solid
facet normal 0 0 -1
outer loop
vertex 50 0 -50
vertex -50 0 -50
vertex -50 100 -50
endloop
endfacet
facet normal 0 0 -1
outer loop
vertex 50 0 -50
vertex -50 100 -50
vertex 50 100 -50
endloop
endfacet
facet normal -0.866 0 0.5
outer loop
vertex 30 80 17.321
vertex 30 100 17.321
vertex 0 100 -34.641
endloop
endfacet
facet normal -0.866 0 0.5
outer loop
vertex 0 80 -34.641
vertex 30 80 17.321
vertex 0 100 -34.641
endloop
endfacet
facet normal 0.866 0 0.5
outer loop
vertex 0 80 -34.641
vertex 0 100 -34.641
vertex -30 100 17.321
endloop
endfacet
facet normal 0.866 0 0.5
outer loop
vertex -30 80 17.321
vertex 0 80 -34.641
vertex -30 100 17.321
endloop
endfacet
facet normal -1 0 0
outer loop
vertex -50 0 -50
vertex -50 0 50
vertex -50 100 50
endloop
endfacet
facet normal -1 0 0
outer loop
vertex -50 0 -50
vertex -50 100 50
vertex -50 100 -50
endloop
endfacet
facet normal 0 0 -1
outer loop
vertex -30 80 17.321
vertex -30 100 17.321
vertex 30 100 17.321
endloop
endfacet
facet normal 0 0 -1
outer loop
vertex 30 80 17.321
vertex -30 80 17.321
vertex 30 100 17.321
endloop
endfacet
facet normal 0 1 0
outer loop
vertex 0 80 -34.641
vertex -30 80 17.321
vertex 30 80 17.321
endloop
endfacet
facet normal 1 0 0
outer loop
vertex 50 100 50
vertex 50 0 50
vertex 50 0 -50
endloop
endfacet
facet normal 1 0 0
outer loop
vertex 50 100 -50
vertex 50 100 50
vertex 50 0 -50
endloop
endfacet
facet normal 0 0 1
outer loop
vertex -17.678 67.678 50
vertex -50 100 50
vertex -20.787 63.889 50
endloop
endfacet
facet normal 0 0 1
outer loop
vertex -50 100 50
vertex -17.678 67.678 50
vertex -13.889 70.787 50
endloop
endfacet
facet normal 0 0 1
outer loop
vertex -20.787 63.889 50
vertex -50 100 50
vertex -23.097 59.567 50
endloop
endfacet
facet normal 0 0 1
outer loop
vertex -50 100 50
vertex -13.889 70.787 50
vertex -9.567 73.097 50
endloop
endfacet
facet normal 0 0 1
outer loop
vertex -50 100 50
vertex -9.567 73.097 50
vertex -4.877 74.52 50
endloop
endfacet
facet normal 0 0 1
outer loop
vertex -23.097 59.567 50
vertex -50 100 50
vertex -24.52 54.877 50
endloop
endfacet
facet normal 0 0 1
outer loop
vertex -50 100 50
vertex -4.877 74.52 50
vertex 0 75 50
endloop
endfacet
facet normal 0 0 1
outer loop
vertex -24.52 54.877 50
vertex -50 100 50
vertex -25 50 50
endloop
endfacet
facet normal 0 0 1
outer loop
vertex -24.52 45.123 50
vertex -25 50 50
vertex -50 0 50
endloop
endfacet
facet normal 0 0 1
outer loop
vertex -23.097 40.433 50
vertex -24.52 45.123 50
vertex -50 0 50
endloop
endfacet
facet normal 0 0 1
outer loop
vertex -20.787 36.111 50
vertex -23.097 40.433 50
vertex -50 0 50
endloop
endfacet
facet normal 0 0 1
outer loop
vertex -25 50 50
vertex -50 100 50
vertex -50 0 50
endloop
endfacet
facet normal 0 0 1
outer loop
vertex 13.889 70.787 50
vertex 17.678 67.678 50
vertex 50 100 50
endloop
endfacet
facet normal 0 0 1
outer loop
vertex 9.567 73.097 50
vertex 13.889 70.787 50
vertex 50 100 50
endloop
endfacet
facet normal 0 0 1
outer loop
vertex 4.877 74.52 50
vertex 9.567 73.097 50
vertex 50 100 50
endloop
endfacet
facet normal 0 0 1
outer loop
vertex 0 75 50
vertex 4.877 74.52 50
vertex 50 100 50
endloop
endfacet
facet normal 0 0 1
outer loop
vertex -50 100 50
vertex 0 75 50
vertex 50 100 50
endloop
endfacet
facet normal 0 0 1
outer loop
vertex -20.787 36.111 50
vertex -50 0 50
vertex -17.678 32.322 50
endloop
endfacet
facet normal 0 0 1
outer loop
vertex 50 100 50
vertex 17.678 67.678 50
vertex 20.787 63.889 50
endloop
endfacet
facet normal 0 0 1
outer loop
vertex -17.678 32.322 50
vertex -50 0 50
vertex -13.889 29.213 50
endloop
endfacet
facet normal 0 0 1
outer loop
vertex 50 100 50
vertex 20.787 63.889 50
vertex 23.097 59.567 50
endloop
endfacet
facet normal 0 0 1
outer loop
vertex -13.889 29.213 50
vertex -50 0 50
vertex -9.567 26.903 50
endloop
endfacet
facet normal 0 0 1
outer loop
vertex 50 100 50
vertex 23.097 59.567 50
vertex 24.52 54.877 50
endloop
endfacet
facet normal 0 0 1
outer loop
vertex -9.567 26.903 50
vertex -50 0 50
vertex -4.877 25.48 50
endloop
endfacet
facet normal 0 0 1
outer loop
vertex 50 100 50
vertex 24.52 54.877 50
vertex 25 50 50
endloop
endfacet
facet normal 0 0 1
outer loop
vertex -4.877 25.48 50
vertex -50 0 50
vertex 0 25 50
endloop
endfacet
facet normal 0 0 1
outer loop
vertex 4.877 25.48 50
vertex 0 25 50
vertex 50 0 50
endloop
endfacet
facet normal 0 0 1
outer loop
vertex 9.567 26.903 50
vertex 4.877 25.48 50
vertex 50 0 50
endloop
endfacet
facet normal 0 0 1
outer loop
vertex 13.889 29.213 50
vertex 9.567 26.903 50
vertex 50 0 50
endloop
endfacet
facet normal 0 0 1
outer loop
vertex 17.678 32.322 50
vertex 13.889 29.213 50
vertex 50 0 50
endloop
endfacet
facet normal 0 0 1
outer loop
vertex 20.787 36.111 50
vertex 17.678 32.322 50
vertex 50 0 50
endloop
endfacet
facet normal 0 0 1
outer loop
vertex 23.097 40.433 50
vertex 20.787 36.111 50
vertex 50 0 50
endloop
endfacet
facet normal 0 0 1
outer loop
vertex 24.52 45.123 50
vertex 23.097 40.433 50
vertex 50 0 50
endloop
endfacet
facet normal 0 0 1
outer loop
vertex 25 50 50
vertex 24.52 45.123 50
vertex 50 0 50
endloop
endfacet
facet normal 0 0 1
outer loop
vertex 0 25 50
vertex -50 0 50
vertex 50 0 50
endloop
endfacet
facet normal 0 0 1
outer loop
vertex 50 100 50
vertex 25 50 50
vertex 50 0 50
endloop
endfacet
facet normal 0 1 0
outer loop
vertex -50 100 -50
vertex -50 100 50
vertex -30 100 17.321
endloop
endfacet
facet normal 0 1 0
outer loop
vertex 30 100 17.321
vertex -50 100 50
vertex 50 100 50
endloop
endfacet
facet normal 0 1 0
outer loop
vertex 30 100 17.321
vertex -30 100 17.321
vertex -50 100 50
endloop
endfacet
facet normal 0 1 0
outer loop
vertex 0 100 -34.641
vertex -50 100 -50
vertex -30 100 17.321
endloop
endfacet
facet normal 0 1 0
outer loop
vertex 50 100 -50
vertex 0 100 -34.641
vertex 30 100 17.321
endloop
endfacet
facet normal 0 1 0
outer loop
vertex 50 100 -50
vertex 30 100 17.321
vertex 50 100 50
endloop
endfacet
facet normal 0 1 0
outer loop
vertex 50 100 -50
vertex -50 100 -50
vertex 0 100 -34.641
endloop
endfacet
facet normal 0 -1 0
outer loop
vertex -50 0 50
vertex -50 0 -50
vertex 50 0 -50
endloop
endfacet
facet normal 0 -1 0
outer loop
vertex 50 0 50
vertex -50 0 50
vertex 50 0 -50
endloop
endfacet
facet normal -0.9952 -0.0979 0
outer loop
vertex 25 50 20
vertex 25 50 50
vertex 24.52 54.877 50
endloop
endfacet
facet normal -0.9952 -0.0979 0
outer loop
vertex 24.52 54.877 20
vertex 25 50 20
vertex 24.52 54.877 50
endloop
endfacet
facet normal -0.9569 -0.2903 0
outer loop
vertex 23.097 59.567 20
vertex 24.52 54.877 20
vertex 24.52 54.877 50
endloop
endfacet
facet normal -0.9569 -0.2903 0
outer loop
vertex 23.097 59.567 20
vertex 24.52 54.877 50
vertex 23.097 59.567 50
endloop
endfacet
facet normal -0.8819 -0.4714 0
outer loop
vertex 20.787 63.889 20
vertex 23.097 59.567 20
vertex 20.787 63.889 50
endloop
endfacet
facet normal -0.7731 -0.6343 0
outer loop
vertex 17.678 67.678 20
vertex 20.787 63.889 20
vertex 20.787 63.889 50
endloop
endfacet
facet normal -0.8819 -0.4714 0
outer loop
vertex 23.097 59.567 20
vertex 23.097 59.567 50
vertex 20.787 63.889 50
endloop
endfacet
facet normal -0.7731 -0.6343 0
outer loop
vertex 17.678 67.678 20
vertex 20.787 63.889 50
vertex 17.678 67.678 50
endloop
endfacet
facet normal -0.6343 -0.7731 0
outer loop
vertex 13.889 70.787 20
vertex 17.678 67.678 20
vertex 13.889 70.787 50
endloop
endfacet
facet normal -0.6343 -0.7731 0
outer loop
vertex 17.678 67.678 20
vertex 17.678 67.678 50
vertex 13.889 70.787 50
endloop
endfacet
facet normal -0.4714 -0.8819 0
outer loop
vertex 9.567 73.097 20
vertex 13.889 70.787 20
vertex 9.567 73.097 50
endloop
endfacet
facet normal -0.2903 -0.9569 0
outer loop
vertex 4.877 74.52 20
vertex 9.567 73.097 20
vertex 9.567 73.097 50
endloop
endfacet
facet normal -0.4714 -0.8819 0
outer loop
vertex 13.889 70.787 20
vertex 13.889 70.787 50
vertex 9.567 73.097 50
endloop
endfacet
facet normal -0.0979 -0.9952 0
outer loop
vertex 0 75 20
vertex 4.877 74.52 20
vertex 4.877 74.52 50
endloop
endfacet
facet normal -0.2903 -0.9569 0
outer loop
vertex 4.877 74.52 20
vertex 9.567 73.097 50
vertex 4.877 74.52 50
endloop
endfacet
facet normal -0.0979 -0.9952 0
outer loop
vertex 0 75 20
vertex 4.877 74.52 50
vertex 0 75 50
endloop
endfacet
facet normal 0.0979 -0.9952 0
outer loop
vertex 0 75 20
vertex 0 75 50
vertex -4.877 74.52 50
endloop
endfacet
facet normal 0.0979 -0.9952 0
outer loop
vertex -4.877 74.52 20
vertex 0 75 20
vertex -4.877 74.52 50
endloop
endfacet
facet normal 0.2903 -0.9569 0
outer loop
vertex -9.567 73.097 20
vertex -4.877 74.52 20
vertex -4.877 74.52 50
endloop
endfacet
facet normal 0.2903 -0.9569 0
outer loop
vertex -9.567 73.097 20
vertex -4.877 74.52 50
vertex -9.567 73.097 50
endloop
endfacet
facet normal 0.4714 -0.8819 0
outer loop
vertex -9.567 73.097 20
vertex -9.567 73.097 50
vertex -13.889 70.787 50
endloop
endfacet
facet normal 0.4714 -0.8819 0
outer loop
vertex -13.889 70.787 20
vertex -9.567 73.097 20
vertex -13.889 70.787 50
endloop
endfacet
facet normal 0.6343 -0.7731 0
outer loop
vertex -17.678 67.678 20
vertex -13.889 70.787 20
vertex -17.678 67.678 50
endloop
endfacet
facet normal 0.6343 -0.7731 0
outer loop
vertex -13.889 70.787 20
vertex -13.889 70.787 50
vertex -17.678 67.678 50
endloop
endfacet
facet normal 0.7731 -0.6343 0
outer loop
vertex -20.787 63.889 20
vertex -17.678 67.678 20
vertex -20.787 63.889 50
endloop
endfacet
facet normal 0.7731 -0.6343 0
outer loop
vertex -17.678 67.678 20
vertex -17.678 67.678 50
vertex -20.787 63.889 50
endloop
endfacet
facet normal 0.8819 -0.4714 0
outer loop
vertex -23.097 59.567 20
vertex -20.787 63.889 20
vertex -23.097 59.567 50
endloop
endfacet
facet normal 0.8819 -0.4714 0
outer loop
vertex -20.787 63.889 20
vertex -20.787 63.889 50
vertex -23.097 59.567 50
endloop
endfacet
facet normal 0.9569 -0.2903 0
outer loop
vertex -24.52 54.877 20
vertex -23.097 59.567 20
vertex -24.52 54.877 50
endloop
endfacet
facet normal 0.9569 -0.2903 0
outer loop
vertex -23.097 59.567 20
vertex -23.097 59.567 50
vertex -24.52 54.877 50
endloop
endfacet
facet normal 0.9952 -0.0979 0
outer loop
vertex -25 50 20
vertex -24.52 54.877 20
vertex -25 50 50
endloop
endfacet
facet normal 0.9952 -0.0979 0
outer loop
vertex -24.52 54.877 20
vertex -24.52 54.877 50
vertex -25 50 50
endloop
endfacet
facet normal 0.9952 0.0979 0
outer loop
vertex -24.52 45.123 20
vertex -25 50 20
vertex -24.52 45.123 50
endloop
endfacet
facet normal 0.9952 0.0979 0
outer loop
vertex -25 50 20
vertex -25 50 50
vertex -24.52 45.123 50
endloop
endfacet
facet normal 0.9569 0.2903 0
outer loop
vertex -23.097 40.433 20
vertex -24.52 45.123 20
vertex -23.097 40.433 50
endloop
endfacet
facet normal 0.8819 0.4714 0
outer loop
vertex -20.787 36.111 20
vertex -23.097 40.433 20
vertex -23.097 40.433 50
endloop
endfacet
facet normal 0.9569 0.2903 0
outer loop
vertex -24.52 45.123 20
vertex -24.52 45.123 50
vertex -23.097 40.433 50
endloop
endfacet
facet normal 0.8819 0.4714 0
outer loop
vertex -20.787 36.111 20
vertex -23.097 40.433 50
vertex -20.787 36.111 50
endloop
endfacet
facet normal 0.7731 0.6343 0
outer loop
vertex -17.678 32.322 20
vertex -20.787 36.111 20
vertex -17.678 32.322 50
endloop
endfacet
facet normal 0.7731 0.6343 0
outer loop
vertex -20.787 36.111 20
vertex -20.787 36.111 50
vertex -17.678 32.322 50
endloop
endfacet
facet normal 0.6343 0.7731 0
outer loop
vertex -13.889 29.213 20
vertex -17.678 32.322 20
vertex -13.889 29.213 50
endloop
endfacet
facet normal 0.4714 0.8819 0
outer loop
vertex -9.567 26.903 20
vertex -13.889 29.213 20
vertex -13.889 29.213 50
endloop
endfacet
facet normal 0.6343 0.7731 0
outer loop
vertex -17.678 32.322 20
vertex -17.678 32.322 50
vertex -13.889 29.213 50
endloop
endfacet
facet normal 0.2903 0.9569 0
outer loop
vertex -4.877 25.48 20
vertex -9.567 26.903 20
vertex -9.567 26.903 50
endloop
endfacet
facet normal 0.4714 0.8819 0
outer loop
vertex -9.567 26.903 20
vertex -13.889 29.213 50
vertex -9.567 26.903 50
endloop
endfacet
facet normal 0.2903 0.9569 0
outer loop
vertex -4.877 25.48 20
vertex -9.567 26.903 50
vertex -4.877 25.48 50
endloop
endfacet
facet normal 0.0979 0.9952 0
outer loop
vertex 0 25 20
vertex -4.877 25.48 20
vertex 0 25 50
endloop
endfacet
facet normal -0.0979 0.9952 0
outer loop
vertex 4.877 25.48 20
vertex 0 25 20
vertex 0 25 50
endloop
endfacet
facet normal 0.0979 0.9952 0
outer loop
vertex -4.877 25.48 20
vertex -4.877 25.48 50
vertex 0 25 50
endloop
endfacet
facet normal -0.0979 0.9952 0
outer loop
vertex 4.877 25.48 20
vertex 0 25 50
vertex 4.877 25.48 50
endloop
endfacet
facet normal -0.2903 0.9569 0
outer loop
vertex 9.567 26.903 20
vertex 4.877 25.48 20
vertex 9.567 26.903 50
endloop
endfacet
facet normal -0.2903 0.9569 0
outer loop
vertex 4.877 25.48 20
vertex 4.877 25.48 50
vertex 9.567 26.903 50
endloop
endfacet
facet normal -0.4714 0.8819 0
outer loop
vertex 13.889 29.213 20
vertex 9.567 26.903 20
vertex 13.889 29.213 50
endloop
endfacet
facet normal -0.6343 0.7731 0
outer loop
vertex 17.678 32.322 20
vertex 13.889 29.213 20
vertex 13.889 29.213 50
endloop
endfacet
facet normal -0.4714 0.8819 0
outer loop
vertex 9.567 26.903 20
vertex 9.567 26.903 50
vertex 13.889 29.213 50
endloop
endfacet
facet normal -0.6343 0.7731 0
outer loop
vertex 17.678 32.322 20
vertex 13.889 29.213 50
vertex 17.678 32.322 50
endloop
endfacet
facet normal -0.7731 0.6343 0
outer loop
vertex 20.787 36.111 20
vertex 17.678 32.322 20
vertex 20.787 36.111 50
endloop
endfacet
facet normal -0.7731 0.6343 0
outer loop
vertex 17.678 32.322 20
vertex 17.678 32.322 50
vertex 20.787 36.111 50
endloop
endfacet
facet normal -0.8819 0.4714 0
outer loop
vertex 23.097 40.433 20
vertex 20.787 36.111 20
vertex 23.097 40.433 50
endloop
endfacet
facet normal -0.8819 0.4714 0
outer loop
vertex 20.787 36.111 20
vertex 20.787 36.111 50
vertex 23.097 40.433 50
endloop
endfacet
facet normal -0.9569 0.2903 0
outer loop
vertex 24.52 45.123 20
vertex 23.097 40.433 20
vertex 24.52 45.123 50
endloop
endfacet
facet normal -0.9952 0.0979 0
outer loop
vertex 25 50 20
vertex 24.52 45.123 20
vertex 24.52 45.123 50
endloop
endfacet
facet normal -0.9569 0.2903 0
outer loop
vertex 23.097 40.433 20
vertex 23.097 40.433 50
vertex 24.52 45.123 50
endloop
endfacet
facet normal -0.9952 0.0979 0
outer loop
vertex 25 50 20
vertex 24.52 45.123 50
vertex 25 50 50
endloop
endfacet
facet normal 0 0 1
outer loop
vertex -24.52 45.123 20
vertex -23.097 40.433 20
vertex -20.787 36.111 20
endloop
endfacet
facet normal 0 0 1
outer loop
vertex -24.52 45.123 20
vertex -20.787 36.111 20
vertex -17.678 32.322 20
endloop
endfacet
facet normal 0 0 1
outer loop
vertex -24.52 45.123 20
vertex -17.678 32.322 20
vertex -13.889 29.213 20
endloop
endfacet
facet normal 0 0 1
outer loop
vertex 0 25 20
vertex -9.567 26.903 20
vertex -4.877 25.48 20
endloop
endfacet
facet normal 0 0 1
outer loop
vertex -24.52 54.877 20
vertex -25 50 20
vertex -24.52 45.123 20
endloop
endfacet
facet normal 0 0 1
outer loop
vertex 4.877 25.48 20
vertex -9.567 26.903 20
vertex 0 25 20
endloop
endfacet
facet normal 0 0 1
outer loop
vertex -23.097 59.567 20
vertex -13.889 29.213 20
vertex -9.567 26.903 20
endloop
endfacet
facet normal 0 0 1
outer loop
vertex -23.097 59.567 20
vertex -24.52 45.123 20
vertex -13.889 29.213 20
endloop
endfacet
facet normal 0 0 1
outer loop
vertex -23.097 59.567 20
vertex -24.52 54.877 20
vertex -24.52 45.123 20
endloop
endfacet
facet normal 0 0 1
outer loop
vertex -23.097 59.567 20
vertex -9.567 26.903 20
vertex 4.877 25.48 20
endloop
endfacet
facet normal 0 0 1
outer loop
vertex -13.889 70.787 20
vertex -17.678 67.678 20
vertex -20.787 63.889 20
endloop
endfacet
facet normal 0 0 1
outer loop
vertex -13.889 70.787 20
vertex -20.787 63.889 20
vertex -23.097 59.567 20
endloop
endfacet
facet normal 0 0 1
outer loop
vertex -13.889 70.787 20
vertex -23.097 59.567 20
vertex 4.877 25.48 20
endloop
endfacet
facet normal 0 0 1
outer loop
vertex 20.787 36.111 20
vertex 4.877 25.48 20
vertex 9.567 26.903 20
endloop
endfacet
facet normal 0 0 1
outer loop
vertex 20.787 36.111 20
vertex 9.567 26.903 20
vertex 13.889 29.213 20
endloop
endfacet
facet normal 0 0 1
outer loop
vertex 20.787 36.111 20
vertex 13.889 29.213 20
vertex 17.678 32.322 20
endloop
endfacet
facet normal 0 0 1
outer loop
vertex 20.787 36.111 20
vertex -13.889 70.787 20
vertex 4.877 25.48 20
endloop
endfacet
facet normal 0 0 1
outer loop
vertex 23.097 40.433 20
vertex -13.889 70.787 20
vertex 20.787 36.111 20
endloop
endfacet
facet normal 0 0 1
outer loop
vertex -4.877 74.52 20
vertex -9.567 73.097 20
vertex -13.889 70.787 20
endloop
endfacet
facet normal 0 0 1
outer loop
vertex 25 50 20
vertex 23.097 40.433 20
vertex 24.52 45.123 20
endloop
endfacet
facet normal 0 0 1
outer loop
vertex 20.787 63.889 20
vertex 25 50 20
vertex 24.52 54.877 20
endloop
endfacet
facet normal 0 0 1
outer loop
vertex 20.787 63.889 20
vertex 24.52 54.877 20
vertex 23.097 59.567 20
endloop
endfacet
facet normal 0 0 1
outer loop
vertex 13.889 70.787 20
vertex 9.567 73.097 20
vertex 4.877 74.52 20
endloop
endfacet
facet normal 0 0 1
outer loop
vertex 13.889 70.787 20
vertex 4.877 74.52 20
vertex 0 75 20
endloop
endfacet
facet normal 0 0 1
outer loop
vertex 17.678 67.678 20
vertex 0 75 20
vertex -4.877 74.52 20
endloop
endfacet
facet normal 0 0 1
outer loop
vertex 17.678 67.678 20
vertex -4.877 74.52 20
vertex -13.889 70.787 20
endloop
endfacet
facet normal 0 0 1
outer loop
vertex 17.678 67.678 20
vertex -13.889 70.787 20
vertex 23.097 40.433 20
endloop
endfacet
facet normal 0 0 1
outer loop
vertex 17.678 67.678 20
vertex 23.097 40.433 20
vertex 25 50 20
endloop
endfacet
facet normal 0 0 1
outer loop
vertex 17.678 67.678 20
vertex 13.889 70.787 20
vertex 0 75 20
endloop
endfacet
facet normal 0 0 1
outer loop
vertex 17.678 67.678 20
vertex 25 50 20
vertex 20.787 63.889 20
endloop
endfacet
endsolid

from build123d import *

# Parameters (mm, degrees)
SKETCH1_W           = 100
SKETCH1_H           = 100
BOSS_EXTRUDE1_DEPTH = 100
SKETCH2_R           = 25
CUT_EXTRUDE1_DEPTH  = 30
CUT_EXTRUDE2_DEPTH  = 20


with BuildPart() as part:
    # Sketch1 → Boss-Extrude1 (new body)
    with BuildSketch(Plane(origin=(0, 0, 0), x_dir=(1, 0, 0), z_dir=(0, 1, 0))):
        Rectangle(SKETCH1_W, SKETCH1_H)
    extrude(amount=BOSS_EXTRUDE1_DEPTH)

    # Sketch2 → Cut-Extrude1 (cut)
    with BuildSketch(Plane.XY.offset(50)):
        with Locations((0, 50)):
            Circle(SKETCH2_R)
    extrude(amount=-CUT_EXTRUDE1_DEPTH, mode=Mode.SUBTRACT)

    # Sketch3 → Cut-Extrude2 (cut)
    with BuildSketch(Plane(origin=(0, 100, 0), x_dir=(1, 0, 0), z_dir=(0, 1, 0))):
        Polygon((0, 34.641016151), (-30, -17.320508076), (30, -17.320508076), align=None)
    extrude(amount=-CUT_EXTRUDE2_DEPTH, mode=Mode.SUBTRACT)


solid = part.part
